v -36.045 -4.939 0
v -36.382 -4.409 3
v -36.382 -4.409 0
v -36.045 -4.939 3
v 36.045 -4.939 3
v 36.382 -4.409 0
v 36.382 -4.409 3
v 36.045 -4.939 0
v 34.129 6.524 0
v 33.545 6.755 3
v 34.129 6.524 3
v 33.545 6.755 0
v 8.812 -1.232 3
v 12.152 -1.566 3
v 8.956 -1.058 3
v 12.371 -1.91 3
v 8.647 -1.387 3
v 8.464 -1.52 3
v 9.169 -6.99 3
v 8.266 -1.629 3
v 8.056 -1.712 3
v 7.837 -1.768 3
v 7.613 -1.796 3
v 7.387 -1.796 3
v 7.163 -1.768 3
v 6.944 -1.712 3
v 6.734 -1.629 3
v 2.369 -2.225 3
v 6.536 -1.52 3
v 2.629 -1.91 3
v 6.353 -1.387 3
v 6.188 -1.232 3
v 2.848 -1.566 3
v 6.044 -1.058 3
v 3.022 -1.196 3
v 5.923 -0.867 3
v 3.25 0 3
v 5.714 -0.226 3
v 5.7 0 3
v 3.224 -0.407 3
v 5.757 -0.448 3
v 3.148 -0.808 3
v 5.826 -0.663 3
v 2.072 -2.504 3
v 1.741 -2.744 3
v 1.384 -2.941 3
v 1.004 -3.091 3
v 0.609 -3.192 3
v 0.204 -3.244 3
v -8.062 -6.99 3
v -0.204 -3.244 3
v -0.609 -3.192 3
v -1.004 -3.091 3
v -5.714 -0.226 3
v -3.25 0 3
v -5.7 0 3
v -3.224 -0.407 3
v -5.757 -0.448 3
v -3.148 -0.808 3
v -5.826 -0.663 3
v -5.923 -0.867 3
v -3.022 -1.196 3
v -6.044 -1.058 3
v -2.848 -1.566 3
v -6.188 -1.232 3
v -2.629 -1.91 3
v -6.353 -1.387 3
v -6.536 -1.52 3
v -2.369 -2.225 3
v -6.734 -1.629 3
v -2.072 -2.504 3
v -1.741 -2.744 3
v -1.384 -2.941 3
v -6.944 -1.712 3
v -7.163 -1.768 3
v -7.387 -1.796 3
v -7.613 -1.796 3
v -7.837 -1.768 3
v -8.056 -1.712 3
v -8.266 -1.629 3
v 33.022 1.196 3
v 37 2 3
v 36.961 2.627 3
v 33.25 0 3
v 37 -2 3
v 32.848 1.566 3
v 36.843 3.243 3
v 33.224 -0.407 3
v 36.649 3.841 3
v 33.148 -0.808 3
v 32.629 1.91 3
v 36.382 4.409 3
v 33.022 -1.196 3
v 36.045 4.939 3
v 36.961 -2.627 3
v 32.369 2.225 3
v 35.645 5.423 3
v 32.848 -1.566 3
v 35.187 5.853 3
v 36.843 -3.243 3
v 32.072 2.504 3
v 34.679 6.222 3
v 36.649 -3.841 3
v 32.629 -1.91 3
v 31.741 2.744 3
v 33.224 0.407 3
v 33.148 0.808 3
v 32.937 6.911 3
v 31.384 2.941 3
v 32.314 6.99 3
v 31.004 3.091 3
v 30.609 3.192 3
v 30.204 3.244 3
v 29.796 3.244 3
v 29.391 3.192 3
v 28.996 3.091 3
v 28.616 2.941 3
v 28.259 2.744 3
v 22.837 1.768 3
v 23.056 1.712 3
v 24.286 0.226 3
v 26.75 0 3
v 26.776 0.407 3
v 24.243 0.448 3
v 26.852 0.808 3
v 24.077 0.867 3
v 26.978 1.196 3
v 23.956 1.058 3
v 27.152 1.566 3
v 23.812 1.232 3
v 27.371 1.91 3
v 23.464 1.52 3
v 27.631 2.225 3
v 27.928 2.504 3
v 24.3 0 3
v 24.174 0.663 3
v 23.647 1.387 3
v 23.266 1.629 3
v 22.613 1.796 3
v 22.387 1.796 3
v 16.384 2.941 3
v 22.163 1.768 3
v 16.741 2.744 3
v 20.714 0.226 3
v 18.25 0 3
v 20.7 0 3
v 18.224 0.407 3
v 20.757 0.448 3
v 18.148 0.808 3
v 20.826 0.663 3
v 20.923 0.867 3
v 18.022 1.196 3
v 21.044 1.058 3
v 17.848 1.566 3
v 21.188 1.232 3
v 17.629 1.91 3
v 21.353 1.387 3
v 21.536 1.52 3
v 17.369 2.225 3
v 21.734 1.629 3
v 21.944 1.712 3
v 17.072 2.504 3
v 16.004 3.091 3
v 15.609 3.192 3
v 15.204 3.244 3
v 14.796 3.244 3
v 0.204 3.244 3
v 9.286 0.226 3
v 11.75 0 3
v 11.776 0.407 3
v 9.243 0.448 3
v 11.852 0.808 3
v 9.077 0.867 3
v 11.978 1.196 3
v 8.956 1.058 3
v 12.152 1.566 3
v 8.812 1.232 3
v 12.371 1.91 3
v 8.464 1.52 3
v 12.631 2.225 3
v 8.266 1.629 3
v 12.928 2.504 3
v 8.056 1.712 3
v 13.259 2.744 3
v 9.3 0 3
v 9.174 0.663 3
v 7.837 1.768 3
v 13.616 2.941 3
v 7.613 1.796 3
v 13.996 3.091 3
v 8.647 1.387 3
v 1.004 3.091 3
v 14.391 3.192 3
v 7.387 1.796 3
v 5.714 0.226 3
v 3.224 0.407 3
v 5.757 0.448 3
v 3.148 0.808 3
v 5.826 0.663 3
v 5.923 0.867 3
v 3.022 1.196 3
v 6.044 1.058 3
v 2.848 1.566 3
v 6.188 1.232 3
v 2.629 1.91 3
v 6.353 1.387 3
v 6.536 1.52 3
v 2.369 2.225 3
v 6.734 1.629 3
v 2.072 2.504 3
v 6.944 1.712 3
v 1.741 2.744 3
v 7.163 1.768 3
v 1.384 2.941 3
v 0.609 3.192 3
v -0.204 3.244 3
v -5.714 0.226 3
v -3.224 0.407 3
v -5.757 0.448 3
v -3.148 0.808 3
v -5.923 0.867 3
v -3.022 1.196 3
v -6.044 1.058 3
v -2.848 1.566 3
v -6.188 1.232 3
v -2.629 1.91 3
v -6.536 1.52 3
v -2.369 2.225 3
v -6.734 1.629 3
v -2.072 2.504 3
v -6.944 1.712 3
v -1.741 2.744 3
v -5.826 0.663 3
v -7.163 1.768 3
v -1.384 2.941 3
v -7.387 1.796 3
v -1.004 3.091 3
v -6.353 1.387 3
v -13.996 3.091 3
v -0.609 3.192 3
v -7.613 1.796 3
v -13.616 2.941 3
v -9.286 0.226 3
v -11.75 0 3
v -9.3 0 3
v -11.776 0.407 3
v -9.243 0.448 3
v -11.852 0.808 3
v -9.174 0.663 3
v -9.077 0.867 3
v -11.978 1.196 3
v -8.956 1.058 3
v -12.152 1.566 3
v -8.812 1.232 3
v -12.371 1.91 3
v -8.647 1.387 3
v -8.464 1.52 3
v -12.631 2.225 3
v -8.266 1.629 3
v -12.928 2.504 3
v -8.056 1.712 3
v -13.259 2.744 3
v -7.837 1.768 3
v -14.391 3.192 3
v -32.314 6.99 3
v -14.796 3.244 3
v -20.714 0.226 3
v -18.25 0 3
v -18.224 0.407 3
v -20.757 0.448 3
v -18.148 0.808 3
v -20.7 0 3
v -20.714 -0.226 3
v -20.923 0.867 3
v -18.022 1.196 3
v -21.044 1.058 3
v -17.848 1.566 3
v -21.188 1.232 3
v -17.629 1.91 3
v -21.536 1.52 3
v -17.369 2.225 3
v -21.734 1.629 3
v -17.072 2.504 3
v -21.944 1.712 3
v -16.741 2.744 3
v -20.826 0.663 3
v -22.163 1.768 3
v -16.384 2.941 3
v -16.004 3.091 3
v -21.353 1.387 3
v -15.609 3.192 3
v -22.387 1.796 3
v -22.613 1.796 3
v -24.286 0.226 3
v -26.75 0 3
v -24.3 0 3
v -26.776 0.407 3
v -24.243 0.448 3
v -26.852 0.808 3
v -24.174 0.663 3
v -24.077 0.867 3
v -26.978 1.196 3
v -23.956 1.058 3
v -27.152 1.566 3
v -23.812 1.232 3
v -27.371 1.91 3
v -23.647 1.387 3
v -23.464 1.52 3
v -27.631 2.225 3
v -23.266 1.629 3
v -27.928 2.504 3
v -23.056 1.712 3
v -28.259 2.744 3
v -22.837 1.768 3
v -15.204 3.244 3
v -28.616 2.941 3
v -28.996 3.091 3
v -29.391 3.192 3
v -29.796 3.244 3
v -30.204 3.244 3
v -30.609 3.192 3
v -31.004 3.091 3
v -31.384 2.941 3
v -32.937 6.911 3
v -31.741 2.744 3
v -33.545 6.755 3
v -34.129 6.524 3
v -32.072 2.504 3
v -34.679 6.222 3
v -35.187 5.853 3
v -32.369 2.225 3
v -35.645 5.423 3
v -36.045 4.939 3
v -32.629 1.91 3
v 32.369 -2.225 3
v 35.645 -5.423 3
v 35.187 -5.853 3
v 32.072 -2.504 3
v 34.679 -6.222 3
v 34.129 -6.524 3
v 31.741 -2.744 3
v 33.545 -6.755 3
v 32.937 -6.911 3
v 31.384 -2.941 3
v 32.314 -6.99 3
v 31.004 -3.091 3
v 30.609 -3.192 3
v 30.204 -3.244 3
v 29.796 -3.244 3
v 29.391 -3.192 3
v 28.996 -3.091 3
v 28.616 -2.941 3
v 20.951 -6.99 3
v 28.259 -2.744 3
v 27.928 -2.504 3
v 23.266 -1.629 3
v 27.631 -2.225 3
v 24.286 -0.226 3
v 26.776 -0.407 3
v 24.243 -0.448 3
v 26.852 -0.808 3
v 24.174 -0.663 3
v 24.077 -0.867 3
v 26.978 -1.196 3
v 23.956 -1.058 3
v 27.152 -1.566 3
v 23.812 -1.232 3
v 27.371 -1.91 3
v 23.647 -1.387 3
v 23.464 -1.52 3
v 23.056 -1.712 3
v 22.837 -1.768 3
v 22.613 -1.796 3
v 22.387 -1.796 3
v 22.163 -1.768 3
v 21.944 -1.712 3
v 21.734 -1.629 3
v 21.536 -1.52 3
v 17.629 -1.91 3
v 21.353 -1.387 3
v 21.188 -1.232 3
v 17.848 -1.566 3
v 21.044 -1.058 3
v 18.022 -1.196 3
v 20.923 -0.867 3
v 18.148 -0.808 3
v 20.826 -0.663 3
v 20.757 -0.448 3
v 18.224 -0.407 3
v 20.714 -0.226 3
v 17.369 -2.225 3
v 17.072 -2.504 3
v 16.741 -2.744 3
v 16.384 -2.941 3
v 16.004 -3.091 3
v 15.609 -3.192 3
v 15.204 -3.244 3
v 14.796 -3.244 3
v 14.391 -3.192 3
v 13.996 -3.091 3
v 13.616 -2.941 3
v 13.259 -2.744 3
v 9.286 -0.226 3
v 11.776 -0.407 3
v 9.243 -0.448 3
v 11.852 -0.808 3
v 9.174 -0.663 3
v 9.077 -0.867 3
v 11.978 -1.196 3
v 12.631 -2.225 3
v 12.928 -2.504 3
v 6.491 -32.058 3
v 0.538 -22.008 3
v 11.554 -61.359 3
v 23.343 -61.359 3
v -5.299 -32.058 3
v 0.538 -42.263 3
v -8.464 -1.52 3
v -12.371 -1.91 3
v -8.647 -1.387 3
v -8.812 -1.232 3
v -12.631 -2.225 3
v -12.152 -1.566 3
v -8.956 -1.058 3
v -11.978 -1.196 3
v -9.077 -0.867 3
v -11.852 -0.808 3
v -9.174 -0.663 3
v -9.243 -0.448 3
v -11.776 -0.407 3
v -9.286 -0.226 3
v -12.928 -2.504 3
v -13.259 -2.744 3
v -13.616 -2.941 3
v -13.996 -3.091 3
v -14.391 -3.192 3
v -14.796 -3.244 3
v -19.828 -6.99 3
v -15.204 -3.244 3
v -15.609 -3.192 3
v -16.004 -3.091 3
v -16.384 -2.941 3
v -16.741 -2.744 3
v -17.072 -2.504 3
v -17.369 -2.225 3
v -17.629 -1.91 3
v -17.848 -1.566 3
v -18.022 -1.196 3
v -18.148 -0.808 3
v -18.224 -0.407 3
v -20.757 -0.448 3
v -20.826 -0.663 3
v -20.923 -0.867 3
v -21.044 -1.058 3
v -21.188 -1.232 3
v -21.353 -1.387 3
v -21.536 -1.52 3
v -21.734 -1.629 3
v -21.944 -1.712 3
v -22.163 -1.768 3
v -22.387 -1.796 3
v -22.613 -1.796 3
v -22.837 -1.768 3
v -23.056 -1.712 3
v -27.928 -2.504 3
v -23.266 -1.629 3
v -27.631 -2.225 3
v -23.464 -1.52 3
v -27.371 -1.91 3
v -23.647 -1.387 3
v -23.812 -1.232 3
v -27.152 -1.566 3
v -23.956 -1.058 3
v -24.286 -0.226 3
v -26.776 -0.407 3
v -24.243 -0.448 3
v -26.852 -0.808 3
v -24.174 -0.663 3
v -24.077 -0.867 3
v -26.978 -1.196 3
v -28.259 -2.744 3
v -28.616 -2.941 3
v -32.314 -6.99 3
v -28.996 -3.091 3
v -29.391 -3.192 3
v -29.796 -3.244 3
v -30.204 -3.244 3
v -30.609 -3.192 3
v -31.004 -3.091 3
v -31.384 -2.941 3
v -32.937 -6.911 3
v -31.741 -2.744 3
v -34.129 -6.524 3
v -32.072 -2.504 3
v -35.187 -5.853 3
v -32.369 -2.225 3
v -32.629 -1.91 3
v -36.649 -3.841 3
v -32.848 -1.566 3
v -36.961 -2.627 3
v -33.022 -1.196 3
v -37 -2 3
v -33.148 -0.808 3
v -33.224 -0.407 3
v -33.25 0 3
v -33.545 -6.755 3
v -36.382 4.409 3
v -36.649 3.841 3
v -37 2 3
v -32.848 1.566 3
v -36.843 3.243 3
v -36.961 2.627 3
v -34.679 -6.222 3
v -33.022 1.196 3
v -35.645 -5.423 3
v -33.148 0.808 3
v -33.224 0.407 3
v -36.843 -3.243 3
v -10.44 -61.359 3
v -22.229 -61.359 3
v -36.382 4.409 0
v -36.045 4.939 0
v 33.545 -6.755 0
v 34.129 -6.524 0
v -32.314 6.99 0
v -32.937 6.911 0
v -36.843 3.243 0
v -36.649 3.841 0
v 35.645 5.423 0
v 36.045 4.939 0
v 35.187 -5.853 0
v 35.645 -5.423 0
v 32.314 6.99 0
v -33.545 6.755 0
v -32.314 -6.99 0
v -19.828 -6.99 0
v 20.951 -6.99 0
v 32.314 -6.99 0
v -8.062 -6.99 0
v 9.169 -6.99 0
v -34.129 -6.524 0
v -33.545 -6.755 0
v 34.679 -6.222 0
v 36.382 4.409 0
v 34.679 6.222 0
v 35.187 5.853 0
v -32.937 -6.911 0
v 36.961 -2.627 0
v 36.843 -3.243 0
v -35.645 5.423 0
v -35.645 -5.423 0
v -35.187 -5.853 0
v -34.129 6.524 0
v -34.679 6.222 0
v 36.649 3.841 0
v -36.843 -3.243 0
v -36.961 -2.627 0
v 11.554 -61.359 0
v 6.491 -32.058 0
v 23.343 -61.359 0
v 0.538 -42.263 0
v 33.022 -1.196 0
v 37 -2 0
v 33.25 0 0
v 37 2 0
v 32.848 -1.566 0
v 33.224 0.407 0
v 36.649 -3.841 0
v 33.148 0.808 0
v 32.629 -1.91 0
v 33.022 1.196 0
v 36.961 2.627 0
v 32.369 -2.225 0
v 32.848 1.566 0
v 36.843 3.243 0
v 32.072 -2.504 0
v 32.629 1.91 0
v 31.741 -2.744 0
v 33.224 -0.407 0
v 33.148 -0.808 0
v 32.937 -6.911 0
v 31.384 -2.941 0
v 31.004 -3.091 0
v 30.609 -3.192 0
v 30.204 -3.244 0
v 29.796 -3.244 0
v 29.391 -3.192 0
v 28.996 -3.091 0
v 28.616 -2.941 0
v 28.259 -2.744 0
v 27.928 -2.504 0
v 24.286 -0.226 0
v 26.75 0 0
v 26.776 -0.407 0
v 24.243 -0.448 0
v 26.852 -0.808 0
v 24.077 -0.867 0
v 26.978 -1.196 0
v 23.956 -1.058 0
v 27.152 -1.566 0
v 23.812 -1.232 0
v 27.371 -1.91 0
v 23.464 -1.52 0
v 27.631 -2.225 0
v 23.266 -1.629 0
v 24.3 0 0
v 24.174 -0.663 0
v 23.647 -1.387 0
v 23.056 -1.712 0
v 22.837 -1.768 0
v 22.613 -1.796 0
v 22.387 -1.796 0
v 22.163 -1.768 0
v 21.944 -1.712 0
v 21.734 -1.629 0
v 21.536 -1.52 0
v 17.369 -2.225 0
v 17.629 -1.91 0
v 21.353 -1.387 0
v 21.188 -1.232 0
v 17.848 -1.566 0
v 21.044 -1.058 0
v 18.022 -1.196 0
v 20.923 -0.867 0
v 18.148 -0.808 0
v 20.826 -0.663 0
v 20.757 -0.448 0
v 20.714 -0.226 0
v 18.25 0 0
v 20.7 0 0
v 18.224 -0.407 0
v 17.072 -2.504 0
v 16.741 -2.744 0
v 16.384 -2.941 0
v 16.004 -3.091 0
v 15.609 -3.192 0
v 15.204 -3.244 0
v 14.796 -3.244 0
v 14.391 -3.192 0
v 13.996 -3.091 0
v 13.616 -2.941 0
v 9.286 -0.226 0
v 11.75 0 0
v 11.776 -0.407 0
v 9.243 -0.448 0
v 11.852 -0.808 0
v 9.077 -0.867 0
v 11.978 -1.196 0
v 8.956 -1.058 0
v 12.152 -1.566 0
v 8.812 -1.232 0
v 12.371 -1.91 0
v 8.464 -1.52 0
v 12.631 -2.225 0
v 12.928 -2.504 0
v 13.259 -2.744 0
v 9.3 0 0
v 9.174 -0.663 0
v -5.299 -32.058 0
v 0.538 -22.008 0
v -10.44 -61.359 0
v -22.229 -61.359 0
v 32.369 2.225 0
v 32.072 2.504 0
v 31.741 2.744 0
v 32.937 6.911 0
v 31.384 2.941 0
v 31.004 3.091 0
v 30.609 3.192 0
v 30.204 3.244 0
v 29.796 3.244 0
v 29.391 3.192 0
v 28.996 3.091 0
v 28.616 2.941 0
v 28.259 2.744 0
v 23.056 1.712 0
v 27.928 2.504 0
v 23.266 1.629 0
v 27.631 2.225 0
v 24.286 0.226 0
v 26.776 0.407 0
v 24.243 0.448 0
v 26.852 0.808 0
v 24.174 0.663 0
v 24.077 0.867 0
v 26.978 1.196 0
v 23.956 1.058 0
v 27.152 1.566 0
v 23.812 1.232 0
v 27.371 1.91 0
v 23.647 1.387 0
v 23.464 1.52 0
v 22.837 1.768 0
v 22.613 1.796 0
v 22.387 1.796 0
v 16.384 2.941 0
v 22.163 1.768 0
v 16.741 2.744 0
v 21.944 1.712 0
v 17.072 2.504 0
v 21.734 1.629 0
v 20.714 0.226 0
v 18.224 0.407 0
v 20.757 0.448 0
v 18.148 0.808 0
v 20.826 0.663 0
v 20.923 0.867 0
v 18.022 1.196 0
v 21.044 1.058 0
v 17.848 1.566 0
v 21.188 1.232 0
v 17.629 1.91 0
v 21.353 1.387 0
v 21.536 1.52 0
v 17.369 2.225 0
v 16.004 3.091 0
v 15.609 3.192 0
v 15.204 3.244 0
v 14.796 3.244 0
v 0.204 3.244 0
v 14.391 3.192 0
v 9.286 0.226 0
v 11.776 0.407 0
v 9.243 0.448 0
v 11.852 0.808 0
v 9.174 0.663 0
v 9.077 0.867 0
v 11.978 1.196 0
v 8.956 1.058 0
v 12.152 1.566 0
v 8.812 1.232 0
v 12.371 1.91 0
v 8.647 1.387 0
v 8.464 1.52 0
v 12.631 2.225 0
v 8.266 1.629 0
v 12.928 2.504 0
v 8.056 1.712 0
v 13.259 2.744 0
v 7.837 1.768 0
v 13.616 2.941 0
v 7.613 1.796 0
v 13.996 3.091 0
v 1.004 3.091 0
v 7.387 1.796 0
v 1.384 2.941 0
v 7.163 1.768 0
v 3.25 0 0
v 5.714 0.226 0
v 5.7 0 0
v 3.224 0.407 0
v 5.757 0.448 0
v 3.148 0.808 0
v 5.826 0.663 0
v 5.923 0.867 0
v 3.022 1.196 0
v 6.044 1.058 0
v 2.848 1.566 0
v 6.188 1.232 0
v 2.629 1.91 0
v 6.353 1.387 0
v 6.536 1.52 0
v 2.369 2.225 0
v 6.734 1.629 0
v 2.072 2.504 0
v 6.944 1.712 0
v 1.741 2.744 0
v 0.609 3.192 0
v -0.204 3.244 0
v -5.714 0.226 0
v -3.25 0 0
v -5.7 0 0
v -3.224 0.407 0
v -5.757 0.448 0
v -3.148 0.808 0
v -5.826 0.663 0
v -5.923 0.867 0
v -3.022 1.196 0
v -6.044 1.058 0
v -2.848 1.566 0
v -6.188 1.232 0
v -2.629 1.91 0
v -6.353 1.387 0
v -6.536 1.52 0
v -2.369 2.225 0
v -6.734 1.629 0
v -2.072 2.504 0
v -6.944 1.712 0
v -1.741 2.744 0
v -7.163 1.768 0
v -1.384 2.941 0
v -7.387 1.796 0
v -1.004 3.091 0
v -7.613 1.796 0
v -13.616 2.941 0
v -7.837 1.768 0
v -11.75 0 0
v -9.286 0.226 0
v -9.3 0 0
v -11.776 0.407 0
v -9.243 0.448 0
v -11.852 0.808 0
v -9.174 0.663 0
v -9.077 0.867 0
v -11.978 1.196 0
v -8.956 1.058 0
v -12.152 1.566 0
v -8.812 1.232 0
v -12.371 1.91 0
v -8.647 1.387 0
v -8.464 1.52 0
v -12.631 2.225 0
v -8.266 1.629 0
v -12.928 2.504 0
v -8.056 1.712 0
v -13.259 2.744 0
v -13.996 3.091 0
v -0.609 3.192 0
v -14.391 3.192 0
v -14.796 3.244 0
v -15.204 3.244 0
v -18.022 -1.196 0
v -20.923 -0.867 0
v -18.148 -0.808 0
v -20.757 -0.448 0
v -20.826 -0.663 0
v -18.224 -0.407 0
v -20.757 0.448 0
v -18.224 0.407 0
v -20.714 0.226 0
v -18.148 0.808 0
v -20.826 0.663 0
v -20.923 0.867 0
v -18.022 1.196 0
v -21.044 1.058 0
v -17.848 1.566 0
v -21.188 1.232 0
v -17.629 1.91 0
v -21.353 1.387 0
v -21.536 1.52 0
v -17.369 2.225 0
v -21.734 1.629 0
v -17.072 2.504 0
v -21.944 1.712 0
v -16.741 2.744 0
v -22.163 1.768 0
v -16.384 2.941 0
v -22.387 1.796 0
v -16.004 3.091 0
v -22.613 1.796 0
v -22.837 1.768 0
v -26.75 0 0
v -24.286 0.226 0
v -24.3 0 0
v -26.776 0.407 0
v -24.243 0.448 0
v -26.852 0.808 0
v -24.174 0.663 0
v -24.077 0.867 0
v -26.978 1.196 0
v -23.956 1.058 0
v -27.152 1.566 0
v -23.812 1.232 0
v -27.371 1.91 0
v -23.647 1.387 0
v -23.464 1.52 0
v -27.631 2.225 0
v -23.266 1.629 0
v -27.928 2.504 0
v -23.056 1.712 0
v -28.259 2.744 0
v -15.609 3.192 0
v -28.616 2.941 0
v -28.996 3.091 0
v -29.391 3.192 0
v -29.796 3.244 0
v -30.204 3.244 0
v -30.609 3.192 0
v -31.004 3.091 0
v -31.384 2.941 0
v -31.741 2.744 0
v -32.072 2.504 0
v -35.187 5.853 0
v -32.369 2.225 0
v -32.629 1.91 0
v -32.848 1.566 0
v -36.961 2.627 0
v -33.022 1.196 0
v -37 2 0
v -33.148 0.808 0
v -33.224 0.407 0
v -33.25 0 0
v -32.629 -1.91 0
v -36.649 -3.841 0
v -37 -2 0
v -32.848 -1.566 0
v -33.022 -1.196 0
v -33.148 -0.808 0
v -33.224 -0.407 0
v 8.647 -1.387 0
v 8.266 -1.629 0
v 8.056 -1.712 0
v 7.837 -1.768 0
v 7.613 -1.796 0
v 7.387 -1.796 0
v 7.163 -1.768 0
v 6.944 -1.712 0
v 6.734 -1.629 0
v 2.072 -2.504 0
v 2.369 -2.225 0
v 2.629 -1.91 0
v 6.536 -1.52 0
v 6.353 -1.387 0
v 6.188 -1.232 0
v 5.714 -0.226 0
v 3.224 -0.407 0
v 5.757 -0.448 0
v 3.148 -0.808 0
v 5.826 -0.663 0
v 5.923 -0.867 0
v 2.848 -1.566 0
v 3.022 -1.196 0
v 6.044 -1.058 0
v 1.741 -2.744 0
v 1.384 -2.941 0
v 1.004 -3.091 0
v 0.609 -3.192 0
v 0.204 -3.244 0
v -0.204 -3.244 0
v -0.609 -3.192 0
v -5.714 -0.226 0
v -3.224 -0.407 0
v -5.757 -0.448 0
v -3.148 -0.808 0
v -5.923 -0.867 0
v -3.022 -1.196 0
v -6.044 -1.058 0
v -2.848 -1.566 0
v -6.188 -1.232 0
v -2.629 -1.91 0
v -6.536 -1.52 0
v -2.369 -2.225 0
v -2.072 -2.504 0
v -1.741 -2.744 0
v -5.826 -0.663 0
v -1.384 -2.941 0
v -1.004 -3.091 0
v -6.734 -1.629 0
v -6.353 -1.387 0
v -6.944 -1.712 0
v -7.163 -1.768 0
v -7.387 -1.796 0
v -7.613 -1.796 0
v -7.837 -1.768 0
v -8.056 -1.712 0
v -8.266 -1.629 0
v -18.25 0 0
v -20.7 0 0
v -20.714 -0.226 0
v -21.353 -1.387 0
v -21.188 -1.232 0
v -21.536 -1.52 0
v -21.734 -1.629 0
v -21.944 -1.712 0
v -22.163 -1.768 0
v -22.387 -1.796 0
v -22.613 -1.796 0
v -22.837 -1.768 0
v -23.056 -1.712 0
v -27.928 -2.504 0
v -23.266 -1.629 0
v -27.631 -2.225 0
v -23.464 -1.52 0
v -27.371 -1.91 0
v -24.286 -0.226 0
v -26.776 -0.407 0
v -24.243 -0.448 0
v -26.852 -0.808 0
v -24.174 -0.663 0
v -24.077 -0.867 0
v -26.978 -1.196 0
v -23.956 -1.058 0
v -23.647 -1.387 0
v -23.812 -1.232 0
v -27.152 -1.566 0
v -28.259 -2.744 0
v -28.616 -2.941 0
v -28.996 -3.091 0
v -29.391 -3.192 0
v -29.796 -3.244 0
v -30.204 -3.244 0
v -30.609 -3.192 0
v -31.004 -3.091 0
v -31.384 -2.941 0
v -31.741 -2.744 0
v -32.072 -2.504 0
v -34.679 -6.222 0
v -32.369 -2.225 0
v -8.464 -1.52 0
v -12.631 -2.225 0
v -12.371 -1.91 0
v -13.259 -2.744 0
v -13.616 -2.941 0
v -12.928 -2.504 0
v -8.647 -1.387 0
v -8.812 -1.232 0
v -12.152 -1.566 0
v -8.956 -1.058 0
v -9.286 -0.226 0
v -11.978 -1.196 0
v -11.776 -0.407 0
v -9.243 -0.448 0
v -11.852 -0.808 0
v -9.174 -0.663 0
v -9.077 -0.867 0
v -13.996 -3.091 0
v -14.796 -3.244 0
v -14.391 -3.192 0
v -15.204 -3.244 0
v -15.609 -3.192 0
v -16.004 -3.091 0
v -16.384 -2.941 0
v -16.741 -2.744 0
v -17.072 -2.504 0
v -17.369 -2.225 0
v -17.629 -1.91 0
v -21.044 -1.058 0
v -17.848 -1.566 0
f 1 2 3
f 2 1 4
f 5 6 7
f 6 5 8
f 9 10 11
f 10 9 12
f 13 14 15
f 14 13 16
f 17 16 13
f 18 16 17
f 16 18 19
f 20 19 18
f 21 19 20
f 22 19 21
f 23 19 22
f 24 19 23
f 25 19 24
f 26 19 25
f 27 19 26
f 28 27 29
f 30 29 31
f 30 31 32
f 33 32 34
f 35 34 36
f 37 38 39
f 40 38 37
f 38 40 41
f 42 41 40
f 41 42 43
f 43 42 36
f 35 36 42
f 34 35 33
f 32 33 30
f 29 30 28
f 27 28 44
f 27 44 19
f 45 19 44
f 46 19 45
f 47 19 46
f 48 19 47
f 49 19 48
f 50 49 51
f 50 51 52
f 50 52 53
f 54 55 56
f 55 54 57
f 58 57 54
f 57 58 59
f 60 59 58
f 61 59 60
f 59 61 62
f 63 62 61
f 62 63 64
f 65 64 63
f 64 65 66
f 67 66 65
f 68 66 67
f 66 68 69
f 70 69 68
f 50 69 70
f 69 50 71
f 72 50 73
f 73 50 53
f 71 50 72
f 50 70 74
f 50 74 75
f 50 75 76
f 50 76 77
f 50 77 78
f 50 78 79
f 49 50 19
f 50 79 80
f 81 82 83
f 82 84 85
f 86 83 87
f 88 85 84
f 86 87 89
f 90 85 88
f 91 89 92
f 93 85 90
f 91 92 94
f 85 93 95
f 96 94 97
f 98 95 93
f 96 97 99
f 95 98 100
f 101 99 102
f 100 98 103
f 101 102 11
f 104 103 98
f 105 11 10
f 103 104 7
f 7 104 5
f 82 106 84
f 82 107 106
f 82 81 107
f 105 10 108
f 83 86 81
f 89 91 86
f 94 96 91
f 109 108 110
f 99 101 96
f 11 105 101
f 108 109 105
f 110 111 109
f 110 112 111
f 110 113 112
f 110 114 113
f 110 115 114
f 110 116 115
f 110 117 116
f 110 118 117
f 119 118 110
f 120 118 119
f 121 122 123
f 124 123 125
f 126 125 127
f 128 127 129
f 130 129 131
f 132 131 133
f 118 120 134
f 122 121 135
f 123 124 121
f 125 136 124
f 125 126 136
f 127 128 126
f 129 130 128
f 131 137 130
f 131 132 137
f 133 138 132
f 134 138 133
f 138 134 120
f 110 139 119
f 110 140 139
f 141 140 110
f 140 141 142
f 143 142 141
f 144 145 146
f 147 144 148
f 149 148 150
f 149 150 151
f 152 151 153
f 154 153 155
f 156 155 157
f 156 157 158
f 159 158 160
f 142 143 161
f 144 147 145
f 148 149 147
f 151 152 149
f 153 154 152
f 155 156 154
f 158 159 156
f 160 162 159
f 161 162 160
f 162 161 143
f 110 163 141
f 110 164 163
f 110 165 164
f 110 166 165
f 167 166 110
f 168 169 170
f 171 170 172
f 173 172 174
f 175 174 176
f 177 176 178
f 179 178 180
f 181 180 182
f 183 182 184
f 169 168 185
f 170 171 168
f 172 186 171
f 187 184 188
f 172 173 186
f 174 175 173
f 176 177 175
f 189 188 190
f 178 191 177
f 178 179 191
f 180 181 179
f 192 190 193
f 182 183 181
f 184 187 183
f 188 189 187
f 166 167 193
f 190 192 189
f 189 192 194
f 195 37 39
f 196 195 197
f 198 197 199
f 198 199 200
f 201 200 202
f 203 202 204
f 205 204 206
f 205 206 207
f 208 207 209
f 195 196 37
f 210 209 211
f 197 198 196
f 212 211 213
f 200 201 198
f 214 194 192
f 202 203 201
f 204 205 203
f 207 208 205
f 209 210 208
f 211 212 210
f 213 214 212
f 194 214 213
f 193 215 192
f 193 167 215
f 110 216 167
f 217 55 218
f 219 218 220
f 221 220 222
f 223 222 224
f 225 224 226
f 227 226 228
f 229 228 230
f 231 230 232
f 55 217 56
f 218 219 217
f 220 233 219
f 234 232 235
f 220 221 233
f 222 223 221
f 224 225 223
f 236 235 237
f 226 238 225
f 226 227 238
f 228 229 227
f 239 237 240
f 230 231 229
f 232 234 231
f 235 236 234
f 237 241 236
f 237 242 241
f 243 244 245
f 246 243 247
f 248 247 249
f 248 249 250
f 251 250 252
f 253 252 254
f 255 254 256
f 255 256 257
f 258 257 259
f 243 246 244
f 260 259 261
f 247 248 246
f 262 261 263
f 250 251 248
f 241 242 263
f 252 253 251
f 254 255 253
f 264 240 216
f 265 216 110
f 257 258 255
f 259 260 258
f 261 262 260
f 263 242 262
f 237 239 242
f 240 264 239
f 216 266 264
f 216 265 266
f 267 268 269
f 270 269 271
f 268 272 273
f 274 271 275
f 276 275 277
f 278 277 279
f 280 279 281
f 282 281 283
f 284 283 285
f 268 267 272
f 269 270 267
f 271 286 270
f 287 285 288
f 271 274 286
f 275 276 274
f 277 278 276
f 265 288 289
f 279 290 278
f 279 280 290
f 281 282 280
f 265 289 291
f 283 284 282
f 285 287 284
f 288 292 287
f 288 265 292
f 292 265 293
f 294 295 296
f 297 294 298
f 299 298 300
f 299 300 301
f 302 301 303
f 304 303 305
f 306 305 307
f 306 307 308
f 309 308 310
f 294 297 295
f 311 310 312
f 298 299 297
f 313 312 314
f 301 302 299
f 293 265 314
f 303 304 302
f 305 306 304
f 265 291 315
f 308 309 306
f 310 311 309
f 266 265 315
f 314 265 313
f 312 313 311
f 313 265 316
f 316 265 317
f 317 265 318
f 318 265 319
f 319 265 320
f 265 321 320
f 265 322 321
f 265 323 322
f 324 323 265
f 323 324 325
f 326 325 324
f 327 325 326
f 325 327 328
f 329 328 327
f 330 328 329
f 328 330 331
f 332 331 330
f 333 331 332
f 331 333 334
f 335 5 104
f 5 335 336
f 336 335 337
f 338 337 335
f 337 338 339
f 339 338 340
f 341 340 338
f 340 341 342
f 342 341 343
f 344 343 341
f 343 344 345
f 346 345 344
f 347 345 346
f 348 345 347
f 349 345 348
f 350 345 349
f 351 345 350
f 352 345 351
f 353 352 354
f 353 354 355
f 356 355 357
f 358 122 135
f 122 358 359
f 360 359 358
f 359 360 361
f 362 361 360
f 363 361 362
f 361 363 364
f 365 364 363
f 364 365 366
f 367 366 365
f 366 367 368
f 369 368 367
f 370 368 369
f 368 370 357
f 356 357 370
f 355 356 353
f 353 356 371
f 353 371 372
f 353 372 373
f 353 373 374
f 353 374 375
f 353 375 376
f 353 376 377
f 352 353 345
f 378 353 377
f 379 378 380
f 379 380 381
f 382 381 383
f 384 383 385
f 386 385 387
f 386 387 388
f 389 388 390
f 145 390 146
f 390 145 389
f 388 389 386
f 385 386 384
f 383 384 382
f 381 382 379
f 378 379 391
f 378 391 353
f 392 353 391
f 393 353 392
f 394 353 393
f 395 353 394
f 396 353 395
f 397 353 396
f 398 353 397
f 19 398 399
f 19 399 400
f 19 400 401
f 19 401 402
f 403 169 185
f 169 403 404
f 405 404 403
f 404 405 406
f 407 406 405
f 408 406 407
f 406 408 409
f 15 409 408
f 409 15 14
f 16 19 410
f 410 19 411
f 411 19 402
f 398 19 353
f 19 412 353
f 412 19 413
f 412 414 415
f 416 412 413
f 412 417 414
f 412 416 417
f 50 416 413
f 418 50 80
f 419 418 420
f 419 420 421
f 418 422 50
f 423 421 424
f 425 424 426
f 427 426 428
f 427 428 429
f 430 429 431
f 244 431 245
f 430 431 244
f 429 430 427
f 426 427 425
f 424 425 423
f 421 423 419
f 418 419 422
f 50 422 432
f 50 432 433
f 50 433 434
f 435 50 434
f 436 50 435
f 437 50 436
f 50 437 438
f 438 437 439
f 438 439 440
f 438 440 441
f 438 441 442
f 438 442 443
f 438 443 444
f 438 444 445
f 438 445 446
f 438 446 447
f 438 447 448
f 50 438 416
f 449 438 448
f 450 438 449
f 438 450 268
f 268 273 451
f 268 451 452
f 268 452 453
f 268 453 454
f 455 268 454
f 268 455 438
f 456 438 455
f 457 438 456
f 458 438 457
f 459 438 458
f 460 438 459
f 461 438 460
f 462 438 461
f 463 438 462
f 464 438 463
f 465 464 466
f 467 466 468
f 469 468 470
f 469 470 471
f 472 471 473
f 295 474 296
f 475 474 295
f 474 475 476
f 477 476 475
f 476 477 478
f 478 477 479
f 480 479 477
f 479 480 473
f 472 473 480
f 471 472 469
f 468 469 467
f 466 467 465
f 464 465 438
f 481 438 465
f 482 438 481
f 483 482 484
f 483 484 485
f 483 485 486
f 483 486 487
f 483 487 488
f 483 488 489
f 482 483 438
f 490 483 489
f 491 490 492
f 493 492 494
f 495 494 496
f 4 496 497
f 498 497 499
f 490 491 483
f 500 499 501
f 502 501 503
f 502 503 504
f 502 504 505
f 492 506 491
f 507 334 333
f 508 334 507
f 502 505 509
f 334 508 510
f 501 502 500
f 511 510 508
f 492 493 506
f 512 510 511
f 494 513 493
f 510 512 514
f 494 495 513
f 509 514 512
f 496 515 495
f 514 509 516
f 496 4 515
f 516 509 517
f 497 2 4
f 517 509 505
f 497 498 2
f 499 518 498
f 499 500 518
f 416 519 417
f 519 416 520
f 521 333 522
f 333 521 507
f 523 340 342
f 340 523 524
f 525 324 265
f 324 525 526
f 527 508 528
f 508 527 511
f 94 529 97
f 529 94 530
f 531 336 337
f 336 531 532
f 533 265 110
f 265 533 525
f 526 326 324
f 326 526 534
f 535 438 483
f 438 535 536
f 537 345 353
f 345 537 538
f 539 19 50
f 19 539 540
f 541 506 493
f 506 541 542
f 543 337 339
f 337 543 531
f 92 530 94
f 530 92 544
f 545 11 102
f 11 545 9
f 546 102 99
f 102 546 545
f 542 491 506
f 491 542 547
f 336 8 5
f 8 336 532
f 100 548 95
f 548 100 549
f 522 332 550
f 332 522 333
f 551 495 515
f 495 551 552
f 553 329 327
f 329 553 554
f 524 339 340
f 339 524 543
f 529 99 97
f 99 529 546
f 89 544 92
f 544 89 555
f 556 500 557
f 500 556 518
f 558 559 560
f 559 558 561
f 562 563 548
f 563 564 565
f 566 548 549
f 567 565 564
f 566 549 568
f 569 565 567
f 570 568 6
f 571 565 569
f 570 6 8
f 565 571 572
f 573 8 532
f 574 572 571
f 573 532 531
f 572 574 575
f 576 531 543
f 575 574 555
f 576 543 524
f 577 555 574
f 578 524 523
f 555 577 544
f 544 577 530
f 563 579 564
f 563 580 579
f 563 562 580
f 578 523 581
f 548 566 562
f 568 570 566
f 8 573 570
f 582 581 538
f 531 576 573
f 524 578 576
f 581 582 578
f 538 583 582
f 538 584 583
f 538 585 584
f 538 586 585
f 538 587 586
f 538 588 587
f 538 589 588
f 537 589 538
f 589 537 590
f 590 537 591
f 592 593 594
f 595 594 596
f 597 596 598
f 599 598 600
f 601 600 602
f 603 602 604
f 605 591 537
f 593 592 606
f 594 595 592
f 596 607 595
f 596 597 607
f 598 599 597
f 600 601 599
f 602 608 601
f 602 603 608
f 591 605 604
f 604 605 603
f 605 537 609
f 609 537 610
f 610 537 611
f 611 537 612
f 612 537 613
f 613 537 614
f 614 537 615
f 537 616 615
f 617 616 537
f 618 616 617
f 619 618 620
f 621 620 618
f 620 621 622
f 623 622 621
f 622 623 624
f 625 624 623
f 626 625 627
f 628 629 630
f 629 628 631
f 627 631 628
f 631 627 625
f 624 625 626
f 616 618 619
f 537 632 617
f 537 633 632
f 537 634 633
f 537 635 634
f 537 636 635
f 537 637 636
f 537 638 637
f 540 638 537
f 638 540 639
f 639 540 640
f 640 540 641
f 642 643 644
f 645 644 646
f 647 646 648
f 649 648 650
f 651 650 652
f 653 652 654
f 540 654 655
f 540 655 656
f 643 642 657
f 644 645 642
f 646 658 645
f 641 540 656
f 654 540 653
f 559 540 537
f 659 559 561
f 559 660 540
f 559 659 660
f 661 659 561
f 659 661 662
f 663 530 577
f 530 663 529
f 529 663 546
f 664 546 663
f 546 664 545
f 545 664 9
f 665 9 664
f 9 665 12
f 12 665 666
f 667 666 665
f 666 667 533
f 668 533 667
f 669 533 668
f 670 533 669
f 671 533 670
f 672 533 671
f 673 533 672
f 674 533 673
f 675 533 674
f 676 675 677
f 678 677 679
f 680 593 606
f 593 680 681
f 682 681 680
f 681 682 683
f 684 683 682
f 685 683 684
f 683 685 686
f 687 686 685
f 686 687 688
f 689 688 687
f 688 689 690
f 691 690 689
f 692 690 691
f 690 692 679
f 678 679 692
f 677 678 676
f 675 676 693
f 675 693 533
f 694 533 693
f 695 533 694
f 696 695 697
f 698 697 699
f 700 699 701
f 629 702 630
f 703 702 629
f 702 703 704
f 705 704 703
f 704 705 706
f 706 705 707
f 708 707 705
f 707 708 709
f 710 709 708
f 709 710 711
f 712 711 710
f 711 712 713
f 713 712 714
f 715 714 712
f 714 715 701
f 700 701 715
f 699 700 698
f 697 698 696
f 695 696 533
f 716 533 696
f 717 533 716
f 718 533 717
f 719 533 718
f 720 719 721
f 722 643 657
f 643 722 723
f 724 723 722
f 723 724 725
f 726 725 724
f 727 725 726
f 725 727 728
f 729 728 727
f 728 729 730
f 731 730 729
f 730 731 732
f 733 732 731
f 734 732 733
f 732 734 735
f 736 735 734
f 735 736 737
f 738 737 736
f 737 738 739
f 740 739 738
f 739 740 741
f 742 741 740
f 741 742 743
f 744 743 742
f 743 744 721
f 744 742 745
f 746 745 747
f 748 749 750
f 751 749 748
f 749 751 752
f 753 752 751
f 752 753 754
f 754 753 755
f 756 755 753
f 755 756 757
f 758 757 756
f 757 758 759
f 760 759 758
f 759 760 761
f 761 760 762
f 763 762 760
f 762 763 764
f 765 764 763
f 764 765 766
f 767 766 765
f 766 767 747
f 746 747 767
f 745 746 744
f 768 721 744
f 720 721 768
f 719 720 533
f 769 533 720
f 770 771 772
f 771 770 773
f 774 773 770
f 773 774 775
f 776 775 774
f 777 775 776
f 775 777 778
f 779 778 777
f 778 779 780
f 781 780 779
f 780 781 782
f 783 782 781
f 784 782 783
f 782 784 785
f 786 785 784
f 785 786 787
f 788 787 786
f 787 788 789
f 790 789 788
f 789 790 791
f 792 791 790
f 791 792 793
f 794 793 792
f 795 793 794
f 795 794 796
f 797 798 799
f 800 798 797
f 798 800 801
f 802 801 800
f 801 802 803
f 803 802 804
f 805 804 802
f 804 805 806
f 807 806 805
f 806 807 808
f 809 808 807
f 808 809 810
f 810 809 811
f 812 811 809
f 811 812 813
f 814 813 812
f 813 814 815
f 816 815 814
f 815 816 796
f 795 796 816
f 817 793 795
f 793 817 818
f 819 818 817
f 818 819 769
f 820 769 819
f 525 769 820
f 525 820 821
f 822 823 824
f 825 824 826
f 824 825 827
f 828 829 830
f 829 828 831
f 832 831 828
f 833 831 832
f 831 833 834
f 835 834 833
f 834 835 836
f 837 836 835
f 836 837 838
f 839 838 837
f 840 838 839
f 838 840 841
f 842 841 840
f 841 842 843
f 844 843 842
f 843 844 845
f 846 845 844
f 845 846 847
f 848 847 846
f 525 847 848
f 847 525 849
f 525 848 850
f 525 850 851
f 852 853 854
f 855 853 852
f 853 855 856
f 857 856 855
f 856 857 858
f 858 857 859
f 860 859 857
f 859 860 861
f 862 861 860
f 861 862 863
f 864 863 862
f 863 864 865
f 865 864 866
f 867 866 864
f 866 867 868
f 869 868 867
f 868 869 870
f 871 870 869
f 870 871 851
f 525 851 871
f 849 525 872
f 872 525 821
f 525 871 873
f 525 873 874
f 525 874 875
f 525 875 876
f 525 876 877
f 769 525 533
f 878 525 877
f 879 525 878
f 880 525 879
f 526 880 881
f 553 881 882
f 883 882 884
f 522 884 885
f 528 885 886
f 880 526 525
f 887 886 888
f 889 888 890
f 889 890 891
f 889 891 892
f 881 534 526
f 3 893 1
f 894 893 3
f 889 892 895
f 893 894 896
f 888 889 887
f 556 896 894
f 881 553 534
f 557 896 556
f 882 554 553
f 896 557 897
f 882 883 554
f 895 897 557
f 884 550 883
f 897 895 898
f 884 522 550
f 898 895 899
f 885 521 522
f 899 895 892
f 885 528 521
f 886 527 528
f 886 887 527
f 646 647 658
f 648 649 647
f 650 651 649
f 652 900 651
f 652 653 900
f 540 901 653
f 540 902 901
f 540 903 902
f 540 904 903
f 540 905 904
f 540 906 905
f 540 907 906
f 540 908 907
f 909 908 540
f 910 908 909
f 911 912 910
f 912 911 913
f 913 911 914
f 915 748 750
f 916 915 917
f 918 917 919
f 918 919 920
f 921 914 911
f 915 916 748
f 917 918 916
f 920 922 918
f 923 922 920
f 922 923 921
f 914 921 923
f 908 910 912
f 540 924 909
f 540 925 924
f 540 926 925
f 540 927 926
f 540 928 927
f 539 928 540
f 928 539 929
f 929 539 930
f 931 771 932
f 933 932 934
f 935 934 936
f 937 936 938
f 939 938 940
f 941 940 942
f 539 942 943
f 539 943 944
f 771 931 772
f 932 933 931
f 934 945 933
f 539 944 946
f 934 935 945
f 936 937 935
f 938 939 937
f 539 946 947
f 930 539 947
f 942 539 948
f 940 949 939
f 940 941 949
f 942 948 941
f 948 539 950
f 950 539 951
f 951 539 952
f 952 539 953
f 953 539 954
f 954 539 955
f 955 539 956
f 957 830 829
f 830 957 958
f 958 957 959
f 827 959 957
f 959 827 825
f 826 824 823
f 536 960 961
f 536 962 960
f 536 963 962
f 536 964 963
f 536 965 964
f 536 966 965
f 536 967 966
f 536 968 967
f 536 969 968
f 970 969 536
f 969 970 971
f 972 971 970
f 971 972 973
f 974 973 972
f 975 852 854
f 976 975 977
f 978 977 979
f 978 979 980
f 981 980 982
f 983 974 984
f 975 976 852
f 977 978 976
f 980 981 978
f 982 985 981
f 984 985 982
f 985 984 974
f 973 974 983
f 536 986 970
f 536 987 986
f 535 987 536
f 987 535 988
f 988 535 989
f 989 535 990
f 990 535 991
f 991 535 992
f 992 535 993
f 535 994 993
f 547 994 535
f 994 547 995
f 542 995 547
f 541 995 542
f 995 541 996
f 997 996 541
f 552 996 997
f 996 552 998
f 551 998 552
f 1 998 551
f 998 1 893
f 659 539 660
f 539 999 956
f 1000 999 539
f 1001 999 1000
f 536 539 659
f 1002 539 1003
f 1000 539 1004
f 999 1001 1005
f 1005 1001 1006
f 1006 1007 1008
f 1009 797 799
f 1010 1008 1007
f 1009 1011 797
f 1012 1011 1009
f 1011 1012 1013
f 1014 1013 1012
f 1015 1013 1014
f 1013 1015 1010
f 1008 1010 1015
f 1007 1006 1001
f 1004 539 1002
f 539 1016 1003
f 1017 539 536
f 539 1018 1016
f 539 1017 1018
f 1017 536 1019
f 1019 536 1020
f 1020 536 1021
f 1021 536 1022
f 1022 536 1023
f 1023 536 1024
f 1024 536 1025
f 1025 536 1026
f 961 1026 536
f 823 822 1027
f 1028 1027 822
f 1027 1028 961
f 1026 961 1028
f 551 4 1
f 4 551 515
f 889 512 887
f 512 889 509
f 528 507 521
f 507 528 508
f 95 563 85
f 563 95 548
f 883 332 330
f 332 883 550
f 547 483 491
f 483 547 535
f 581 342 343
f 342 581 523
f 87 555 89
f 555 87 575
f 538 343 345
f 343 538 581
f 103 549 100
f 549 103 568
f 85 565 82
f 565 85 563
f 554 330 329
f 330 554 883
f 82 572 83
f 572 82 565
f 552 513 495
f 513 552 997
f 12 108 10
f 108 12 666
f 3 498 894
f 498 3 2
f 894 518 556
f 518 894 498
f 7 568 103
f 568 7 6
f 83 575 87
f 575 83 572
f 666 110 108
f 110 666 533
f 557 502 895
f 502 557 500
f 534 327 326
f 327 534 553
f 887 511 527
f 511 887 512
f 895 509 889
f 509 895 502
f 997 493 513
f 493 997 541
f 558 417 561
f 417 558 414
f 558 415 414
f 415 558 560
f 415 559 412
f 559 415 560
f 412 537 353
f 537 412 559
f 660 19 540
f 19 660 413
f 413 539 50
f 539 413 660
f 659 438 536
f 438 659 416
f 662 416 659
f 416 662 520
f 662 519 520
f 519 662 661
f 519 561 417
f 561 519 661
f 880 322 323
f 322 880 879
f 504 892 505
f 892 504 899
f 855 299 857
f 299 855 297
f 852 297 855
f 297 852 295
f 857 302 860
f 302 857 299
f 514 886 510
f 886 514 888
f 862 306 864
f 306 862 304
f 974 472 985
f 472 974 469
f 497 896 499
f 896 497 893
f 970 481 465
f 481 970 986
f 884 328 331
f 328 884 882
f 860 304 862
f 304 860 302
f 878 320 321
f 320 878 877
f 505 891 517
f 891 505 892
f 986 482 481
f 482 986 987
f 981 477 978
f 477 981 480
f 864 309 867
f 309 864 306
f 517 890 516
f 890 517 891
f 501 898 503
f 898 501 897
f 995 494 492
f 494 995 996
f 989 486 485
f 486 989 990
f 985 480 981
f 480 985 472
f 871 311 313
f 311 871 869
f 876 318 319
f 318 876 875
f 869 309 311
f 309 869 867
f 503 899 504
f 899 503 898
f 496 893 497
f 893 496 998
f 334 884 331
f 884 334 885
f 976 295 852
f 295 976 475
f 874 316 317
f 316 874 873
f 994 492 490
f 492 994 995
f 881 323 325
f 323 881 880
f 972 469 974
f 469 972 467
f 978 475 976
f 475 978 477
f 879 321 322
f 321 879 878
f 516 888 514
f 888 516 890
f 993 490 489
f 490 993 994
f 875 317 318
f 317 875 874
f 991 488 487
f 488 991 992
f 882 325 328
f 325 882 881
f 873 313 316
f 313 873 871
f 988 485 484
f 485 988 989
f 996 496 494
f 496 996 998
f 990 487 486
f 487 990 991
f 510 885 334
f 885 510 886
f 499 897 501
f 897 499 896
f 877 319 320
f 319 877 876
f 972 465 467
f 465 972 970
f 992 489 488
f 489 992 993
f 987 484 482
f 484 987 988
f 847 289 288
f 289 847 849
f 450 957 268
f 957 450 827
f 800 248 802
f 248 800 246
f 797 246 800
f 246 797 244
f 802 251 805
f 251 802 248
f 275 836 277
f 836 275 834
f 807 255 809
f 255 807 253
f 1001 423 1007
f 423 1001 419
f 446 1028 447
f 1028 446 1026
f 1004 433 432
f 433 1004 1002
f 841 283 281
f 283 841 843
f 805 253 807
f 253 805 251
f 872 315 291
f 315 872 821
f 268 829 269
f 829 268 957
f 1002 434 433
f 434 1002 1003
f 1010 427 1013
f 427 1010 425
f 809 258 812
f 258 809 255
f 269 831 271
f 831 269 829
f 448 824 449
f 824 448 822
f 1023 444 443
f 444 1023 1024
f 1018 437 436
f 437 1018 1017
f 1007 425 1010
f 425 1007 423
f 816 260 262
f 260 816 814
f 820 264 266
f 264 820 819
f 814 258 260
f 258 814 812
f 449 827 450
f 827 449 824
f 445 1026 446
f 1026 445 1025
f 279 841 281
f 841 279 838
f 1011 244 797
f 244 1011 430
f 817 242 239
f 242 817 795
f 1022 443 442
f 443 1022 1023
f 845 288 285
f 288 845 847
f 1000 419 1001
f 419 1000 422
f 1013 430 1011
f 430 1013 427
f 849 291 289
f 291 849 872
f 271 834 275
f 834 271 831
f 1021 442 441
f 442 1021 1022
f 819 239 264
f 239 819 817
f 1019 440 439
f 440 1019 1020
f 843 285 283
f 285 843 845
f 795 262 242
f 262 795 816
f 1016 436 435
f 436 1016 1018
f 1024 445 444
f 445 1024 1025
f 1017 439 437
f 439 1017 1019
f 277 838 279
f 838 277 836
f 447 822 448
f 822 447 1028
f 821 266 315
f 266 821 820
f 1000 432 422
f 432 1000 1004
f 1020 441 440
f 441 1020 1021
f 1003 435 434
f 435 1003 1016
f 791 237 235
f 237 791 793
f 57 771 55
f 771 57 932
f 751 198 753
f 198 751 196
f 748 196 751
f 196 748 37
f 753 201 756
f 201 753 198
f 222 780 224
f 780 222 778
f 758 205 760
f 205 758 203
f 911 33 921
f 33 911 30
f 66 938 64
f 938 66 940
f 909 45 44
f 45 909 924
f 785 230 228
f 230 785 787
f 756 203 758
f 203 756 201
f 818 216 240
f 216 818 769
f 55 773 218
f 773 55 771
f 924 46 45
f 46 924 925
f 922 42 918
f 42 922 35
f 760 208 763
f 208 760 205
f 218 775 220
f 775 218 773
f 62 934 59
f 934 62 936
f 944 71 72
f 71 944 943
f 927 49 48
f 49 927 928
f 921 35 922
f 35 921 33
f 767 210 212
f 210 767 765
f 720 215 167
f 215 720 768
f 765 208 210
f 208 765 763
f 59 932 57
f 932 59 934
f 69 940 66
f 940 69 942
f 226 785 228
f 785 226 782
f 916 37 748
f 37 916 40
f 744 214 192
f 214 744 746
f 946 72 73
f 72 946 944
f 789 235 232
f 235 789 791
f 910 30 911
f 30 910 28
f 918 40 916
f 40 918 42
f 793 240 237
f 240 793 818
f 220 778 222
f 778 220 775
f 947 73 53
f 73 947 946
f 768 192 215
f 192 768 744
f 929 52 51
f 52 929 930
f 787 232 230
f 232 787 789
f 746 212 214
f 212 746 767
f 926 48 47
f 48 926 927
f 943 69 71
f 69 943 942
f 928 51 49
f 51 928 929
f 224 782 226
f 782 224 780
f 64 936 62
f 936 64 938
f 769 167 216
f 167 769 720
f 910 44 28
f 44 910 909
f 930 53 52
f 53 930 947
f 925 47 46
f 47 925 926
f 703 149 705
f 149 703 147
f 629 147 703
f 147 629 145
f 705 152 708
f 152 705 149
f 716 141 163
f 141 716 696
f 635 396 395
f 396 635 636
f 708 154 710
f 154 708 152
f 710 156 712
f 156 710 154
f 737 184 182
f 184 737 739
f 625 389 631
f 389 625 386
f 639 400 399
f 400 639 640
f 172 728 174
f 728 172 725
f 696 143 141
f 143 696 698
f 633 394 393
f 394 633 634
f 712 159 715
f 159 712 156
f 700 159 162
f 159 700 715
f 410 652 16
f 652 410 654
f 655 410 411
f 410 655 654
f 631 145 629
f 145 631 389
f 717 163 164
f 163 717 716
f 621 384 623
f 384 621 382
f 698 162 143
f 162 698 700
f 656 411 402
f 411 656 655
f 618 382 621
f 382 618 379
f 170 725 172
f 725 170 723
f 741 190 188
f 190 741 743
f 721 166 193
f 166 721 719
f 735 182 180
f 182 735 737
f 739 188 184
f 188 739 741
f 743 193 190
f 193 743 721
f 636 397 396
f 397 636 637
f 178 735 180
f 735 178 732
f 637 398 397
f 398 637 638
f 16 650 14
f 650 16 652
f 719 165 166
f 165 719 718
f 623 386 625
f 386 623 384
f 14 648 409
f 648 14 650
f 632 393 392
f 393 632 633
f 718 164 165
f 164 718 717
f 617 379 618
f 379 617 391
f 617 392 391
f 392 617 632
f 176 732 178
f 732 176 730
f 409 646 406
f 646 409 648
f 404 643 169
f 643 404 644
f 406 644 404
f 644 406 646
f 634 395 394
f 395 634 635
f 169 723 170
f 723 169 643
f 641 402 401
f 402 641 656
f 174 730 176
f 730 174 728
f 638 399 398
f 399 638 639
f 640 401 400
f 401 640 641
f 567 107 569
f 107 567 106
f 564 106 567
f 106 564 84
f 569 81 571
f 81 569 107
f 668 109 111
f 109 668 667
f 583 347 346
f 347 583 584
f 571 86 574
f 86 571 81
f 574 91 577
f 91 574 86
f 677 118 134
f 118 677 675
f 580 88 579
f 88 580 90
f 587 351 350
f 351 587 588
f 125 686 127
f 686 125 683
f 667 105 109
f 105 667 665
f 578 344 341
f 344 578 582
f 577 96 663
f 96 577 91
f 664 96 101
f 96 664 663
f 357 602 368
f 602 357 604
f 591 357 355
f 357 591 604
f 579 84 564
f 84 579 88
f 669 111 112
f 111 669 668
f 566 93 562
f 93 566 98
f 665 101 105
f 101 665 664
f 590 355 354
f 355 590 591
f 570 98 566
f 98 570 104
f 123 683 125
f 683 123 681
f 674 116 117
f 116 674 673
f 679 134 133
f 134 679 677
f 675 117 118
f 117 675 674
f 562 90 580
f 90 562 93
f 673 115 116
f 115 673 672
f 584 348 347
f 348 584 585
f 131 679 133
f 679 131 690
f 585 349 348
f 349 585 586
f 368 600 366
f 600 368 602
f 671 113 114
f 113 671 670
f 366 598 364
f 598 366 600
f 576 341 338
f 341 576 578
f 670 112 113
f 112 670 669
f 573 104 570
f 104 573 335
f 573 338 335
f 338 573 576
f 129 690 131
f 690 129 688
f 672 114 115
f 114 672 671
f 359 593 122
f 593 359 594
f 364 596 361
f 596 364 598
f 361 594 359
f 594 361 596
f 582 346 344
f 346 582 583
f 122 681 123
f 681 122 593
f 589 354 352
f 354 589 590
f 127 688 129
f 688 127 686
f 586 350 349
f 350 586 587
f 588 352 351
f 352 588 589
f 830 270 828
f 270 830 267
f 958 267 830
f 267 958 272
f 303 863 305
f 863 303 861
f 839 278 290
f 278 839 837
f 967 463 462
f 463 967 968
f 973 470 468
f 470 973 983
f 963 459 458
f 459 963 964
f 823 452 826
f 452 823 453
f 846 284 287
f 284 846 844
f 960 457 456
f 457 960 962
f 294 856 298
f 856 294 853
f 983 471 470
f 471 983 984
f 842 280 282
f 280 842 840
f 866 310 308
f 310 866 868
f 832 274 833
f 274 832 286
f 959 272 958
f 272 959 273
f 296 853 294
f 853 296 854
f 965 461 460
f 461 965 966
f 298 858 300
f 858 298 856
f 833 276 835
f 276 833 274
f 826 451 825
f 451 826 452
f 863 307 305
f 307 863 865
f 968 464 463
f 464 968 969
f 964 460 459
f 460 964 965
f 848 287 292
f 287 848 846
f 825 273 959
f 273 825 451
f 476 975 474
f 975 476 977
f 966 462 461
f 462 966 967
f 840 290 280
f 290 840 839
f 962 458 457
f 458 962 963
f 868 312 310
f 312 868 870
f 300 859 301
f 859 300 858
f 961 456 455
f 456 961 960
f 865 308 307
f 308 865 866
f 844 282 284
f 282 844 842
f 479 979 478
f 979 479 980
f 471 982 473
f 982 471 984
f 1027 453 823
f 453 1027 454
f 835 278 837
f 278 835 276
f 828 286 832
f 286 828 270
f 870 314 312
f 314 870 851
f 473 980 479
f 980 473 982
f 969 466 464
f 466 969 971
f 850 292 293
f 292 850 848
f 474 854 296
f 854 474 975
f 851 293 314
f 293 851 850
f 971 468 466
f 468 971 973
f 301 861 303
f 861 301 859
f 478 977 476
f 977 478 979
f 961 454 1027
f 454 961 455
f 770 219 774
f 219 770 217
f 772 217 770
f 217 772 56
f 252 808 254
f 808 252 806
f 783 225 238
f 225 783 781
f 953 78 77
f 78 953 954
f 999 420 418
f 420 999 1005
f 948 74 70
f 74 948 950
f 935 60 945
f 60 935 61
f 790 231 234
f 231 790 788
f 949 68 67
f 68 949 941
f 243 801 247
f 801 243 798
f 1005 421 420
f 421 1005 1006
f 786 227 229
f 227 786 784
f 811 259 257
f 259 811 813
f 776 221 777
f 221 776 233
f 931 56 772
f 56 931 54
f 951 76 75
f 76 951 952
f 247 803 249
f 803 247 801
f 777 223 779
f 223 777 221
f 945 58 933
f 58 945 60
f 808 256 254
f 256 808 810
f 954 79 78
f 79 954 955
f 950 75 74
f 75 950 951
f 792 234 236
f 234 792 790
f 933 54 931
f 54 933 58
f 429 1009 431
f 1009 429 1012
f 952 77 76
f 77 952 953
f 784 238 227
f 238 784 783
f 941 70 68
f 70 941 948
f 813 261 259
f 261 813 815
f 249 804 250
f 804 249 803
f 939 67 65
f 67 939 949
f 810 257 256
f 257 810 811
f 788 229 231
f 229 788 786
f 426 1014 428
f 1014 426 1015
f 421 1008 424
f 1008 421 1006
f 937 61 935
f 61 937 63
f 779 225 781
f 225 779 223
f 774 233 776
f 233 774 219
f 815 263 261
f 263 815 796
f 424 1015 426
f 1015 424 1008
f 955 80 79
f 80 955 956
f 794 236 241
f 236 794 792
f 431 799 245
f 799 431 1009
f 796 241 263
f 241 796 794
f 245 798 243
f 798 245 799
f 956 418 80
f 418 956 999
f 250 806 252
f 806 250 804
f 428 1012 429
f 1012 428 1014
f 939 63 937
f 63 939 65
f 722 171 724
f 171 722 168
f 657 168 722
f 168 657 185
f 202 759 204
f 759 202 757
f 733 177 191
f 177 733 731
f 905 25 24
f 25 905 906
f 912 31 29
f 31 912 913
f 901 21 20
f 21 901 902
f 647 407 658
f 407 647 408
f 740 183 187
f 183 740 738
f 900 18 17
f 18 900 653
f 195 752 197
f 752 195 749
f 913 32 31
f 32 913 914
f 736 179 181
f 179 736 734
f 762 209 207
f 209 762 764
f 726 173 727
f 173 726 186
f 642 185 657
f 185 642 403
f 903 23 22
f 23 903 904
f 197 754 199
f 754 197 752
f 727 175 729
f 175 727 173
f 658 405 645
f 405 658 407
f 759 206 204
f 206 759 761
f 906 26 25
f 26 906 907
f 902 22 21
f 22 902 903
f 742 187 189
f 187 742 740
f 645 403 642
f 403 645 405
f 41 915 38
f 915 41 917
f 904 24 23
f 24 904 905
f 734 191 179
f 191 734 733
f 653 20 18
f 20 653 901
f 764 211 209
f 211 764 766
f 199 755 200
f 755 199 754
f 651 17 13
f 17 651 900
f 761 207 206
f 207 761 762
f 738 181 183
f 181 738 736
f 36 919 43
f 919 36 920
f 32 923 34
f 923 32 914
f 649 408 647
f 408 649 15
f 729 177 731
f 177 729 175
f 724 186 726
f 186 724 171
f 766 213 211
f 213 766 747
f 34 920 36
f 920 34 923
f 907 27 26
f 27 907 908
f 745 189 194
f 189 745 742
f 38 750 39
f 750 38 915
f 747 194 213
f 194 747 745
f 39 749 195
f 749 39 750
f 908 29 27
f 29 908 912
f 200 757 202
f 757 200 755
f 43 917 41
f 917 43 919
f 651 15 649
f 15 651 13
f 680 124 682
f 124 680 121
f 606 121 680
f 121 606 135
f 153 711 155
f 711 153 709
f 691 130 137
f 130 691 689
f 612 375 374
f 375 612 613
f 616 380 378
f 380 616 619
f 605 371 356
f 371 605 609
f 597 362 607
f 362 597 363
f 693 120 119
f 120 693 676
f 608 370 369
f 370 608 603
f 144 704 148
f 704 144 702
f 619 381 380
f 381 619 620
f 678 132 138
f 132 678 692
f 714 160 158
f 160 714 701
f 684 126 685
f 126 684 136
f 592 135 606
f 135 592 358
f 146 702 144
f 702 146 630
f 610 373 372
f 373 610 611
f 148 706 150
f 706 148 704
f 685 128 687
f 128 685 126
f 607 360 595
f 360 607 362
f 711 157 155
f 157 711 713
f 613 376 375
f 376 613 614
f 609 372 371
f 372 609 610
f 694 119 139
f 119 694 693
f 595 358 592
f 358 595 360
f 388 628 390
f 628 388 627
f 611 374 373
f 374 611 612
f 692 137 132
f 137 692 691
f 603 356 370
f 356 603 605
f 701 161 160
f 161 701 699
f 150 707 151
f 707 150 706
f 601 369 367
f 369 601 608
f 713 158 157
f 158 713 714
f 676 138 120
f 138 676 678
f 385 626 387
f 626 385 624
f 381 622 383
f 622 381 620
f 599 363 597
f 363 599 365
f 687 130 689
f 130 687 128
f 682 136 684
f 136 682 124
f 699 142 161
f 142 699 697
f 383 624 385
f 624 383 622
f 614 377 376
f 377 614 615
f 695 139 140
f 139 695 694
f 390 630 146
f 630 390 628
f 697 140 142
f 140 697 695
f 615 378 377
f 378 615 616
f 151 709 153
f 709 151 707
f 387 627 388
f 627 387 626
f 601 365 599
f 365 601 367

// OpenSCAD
$fn = 50;


difference() {
	union() {
		hull() {
			translate(v = [-32.0000000000, 2.0000000000, 0]) {
				cylinder(h = 3, r = 5);
			}
			translate(v = [32.0000000000, 2.0000000000, 0]) {
				cylinder(h = 3, r = 5);
			}
			translate(v = [-32.0000000000, -2.0000000000, 0]) {
				cylinder(h = 3, r = 5);
			}
			translate(v = [32.0000000000, -2.0000000000, 0]) {
				cylinder(h = 3, r = 5);
			}
		}
		translate(v = [0, -5, 0]) {
			linear_extrude(height = 3) {
				text(font = "DejaVu Sans Mono:style=Bold", halign = "center", size = 57.0000000000, text = "X", valign = "top");
			}
		}
	}
	union() {
		translate(v = [-30.0000000000, 0.0000000000, 0]) {
			translate(v = [0, 0, -100]) {
				cylinder(h = 200, r = 3.2500000000);
			}
		}
		translate(v = [-15.0000000000, 0.0000000000, 0]) {
			translate(v = [0, 0, -100]) {
				cylinder(h = 200, r = 3.2500000000);
			}
		}
		translate(v = [0, 0, -100]) {
			cylinder(h = 200, r = 3.2500000000);
		}
		translate(v = [15.0000000000, 0.0000000000, 0]) {
			translate(v = [0, 0, -100]) {
				cylinder(h = 200, r = 3.2500000000);
			}
		}
		translate(v = [30.0000000000, 0.0000000000, 0]) {
			translate(v = [0, 0, -100]) {
				cylinder(h = 200, r = 3.2500000000);
			}
		}
		translate(v = [-30.0000000000, 0.0000000000, 0]) {
			translate(v = [0, 0, -100]) {
				cylinder(h = 200, r = 1.8000000000);
			}
		}
		translate(v = [-22.5000000000, 0.0000000000, 0]) {
			translate(v = [0, 0, -100]) {
				cylinder(h = 200, r = 1.8000000000);
			}
		}
		translate(v = [-15.0000000000, 0.0000000000, 0]) {
			translate(v = [0, 0, -100]) {
				cylinder(h = 200, r = 1.8000000000);
			}
		}
		translate(v = [-7.5000000000, 0.0000000000, 0]) {
			translate(v = [0, 0, -100]) {
				cylinder(h = 200, r = 1.8000000000);
			}
		}
		translate(v = [0, 0, -100]) {
			cylinder(h = 200, r = 1.8000000000);
		}
		translate(v = [7.5000000000, 0.0000000000, 0]) {
			translate(v = [0, 0, -100]) {
				cylinder(h = 200, r = 1.8000000000);
			}
		}
		translate(v = [15.0000000000, 0.0000000000, 0]) {
			translate(v = [0, 0, -100]) {
				cylinder(h = 200, r = 1.8000000000);
			}
		}
		translate(v = [22.5000000000, 0.0000000000, 0]) {
			translate(v = [0, 0, -100]) {
				cylinder(h = 200, r = 1.8000000000);
			}
		}
		translate(v = [30.0000000000, 0.0000000000, 0]) {
			translate(v = [0, 0, -100]) {
				cylinder(h = 200, r = 1.8000000000);
			}
		}
	}
}
